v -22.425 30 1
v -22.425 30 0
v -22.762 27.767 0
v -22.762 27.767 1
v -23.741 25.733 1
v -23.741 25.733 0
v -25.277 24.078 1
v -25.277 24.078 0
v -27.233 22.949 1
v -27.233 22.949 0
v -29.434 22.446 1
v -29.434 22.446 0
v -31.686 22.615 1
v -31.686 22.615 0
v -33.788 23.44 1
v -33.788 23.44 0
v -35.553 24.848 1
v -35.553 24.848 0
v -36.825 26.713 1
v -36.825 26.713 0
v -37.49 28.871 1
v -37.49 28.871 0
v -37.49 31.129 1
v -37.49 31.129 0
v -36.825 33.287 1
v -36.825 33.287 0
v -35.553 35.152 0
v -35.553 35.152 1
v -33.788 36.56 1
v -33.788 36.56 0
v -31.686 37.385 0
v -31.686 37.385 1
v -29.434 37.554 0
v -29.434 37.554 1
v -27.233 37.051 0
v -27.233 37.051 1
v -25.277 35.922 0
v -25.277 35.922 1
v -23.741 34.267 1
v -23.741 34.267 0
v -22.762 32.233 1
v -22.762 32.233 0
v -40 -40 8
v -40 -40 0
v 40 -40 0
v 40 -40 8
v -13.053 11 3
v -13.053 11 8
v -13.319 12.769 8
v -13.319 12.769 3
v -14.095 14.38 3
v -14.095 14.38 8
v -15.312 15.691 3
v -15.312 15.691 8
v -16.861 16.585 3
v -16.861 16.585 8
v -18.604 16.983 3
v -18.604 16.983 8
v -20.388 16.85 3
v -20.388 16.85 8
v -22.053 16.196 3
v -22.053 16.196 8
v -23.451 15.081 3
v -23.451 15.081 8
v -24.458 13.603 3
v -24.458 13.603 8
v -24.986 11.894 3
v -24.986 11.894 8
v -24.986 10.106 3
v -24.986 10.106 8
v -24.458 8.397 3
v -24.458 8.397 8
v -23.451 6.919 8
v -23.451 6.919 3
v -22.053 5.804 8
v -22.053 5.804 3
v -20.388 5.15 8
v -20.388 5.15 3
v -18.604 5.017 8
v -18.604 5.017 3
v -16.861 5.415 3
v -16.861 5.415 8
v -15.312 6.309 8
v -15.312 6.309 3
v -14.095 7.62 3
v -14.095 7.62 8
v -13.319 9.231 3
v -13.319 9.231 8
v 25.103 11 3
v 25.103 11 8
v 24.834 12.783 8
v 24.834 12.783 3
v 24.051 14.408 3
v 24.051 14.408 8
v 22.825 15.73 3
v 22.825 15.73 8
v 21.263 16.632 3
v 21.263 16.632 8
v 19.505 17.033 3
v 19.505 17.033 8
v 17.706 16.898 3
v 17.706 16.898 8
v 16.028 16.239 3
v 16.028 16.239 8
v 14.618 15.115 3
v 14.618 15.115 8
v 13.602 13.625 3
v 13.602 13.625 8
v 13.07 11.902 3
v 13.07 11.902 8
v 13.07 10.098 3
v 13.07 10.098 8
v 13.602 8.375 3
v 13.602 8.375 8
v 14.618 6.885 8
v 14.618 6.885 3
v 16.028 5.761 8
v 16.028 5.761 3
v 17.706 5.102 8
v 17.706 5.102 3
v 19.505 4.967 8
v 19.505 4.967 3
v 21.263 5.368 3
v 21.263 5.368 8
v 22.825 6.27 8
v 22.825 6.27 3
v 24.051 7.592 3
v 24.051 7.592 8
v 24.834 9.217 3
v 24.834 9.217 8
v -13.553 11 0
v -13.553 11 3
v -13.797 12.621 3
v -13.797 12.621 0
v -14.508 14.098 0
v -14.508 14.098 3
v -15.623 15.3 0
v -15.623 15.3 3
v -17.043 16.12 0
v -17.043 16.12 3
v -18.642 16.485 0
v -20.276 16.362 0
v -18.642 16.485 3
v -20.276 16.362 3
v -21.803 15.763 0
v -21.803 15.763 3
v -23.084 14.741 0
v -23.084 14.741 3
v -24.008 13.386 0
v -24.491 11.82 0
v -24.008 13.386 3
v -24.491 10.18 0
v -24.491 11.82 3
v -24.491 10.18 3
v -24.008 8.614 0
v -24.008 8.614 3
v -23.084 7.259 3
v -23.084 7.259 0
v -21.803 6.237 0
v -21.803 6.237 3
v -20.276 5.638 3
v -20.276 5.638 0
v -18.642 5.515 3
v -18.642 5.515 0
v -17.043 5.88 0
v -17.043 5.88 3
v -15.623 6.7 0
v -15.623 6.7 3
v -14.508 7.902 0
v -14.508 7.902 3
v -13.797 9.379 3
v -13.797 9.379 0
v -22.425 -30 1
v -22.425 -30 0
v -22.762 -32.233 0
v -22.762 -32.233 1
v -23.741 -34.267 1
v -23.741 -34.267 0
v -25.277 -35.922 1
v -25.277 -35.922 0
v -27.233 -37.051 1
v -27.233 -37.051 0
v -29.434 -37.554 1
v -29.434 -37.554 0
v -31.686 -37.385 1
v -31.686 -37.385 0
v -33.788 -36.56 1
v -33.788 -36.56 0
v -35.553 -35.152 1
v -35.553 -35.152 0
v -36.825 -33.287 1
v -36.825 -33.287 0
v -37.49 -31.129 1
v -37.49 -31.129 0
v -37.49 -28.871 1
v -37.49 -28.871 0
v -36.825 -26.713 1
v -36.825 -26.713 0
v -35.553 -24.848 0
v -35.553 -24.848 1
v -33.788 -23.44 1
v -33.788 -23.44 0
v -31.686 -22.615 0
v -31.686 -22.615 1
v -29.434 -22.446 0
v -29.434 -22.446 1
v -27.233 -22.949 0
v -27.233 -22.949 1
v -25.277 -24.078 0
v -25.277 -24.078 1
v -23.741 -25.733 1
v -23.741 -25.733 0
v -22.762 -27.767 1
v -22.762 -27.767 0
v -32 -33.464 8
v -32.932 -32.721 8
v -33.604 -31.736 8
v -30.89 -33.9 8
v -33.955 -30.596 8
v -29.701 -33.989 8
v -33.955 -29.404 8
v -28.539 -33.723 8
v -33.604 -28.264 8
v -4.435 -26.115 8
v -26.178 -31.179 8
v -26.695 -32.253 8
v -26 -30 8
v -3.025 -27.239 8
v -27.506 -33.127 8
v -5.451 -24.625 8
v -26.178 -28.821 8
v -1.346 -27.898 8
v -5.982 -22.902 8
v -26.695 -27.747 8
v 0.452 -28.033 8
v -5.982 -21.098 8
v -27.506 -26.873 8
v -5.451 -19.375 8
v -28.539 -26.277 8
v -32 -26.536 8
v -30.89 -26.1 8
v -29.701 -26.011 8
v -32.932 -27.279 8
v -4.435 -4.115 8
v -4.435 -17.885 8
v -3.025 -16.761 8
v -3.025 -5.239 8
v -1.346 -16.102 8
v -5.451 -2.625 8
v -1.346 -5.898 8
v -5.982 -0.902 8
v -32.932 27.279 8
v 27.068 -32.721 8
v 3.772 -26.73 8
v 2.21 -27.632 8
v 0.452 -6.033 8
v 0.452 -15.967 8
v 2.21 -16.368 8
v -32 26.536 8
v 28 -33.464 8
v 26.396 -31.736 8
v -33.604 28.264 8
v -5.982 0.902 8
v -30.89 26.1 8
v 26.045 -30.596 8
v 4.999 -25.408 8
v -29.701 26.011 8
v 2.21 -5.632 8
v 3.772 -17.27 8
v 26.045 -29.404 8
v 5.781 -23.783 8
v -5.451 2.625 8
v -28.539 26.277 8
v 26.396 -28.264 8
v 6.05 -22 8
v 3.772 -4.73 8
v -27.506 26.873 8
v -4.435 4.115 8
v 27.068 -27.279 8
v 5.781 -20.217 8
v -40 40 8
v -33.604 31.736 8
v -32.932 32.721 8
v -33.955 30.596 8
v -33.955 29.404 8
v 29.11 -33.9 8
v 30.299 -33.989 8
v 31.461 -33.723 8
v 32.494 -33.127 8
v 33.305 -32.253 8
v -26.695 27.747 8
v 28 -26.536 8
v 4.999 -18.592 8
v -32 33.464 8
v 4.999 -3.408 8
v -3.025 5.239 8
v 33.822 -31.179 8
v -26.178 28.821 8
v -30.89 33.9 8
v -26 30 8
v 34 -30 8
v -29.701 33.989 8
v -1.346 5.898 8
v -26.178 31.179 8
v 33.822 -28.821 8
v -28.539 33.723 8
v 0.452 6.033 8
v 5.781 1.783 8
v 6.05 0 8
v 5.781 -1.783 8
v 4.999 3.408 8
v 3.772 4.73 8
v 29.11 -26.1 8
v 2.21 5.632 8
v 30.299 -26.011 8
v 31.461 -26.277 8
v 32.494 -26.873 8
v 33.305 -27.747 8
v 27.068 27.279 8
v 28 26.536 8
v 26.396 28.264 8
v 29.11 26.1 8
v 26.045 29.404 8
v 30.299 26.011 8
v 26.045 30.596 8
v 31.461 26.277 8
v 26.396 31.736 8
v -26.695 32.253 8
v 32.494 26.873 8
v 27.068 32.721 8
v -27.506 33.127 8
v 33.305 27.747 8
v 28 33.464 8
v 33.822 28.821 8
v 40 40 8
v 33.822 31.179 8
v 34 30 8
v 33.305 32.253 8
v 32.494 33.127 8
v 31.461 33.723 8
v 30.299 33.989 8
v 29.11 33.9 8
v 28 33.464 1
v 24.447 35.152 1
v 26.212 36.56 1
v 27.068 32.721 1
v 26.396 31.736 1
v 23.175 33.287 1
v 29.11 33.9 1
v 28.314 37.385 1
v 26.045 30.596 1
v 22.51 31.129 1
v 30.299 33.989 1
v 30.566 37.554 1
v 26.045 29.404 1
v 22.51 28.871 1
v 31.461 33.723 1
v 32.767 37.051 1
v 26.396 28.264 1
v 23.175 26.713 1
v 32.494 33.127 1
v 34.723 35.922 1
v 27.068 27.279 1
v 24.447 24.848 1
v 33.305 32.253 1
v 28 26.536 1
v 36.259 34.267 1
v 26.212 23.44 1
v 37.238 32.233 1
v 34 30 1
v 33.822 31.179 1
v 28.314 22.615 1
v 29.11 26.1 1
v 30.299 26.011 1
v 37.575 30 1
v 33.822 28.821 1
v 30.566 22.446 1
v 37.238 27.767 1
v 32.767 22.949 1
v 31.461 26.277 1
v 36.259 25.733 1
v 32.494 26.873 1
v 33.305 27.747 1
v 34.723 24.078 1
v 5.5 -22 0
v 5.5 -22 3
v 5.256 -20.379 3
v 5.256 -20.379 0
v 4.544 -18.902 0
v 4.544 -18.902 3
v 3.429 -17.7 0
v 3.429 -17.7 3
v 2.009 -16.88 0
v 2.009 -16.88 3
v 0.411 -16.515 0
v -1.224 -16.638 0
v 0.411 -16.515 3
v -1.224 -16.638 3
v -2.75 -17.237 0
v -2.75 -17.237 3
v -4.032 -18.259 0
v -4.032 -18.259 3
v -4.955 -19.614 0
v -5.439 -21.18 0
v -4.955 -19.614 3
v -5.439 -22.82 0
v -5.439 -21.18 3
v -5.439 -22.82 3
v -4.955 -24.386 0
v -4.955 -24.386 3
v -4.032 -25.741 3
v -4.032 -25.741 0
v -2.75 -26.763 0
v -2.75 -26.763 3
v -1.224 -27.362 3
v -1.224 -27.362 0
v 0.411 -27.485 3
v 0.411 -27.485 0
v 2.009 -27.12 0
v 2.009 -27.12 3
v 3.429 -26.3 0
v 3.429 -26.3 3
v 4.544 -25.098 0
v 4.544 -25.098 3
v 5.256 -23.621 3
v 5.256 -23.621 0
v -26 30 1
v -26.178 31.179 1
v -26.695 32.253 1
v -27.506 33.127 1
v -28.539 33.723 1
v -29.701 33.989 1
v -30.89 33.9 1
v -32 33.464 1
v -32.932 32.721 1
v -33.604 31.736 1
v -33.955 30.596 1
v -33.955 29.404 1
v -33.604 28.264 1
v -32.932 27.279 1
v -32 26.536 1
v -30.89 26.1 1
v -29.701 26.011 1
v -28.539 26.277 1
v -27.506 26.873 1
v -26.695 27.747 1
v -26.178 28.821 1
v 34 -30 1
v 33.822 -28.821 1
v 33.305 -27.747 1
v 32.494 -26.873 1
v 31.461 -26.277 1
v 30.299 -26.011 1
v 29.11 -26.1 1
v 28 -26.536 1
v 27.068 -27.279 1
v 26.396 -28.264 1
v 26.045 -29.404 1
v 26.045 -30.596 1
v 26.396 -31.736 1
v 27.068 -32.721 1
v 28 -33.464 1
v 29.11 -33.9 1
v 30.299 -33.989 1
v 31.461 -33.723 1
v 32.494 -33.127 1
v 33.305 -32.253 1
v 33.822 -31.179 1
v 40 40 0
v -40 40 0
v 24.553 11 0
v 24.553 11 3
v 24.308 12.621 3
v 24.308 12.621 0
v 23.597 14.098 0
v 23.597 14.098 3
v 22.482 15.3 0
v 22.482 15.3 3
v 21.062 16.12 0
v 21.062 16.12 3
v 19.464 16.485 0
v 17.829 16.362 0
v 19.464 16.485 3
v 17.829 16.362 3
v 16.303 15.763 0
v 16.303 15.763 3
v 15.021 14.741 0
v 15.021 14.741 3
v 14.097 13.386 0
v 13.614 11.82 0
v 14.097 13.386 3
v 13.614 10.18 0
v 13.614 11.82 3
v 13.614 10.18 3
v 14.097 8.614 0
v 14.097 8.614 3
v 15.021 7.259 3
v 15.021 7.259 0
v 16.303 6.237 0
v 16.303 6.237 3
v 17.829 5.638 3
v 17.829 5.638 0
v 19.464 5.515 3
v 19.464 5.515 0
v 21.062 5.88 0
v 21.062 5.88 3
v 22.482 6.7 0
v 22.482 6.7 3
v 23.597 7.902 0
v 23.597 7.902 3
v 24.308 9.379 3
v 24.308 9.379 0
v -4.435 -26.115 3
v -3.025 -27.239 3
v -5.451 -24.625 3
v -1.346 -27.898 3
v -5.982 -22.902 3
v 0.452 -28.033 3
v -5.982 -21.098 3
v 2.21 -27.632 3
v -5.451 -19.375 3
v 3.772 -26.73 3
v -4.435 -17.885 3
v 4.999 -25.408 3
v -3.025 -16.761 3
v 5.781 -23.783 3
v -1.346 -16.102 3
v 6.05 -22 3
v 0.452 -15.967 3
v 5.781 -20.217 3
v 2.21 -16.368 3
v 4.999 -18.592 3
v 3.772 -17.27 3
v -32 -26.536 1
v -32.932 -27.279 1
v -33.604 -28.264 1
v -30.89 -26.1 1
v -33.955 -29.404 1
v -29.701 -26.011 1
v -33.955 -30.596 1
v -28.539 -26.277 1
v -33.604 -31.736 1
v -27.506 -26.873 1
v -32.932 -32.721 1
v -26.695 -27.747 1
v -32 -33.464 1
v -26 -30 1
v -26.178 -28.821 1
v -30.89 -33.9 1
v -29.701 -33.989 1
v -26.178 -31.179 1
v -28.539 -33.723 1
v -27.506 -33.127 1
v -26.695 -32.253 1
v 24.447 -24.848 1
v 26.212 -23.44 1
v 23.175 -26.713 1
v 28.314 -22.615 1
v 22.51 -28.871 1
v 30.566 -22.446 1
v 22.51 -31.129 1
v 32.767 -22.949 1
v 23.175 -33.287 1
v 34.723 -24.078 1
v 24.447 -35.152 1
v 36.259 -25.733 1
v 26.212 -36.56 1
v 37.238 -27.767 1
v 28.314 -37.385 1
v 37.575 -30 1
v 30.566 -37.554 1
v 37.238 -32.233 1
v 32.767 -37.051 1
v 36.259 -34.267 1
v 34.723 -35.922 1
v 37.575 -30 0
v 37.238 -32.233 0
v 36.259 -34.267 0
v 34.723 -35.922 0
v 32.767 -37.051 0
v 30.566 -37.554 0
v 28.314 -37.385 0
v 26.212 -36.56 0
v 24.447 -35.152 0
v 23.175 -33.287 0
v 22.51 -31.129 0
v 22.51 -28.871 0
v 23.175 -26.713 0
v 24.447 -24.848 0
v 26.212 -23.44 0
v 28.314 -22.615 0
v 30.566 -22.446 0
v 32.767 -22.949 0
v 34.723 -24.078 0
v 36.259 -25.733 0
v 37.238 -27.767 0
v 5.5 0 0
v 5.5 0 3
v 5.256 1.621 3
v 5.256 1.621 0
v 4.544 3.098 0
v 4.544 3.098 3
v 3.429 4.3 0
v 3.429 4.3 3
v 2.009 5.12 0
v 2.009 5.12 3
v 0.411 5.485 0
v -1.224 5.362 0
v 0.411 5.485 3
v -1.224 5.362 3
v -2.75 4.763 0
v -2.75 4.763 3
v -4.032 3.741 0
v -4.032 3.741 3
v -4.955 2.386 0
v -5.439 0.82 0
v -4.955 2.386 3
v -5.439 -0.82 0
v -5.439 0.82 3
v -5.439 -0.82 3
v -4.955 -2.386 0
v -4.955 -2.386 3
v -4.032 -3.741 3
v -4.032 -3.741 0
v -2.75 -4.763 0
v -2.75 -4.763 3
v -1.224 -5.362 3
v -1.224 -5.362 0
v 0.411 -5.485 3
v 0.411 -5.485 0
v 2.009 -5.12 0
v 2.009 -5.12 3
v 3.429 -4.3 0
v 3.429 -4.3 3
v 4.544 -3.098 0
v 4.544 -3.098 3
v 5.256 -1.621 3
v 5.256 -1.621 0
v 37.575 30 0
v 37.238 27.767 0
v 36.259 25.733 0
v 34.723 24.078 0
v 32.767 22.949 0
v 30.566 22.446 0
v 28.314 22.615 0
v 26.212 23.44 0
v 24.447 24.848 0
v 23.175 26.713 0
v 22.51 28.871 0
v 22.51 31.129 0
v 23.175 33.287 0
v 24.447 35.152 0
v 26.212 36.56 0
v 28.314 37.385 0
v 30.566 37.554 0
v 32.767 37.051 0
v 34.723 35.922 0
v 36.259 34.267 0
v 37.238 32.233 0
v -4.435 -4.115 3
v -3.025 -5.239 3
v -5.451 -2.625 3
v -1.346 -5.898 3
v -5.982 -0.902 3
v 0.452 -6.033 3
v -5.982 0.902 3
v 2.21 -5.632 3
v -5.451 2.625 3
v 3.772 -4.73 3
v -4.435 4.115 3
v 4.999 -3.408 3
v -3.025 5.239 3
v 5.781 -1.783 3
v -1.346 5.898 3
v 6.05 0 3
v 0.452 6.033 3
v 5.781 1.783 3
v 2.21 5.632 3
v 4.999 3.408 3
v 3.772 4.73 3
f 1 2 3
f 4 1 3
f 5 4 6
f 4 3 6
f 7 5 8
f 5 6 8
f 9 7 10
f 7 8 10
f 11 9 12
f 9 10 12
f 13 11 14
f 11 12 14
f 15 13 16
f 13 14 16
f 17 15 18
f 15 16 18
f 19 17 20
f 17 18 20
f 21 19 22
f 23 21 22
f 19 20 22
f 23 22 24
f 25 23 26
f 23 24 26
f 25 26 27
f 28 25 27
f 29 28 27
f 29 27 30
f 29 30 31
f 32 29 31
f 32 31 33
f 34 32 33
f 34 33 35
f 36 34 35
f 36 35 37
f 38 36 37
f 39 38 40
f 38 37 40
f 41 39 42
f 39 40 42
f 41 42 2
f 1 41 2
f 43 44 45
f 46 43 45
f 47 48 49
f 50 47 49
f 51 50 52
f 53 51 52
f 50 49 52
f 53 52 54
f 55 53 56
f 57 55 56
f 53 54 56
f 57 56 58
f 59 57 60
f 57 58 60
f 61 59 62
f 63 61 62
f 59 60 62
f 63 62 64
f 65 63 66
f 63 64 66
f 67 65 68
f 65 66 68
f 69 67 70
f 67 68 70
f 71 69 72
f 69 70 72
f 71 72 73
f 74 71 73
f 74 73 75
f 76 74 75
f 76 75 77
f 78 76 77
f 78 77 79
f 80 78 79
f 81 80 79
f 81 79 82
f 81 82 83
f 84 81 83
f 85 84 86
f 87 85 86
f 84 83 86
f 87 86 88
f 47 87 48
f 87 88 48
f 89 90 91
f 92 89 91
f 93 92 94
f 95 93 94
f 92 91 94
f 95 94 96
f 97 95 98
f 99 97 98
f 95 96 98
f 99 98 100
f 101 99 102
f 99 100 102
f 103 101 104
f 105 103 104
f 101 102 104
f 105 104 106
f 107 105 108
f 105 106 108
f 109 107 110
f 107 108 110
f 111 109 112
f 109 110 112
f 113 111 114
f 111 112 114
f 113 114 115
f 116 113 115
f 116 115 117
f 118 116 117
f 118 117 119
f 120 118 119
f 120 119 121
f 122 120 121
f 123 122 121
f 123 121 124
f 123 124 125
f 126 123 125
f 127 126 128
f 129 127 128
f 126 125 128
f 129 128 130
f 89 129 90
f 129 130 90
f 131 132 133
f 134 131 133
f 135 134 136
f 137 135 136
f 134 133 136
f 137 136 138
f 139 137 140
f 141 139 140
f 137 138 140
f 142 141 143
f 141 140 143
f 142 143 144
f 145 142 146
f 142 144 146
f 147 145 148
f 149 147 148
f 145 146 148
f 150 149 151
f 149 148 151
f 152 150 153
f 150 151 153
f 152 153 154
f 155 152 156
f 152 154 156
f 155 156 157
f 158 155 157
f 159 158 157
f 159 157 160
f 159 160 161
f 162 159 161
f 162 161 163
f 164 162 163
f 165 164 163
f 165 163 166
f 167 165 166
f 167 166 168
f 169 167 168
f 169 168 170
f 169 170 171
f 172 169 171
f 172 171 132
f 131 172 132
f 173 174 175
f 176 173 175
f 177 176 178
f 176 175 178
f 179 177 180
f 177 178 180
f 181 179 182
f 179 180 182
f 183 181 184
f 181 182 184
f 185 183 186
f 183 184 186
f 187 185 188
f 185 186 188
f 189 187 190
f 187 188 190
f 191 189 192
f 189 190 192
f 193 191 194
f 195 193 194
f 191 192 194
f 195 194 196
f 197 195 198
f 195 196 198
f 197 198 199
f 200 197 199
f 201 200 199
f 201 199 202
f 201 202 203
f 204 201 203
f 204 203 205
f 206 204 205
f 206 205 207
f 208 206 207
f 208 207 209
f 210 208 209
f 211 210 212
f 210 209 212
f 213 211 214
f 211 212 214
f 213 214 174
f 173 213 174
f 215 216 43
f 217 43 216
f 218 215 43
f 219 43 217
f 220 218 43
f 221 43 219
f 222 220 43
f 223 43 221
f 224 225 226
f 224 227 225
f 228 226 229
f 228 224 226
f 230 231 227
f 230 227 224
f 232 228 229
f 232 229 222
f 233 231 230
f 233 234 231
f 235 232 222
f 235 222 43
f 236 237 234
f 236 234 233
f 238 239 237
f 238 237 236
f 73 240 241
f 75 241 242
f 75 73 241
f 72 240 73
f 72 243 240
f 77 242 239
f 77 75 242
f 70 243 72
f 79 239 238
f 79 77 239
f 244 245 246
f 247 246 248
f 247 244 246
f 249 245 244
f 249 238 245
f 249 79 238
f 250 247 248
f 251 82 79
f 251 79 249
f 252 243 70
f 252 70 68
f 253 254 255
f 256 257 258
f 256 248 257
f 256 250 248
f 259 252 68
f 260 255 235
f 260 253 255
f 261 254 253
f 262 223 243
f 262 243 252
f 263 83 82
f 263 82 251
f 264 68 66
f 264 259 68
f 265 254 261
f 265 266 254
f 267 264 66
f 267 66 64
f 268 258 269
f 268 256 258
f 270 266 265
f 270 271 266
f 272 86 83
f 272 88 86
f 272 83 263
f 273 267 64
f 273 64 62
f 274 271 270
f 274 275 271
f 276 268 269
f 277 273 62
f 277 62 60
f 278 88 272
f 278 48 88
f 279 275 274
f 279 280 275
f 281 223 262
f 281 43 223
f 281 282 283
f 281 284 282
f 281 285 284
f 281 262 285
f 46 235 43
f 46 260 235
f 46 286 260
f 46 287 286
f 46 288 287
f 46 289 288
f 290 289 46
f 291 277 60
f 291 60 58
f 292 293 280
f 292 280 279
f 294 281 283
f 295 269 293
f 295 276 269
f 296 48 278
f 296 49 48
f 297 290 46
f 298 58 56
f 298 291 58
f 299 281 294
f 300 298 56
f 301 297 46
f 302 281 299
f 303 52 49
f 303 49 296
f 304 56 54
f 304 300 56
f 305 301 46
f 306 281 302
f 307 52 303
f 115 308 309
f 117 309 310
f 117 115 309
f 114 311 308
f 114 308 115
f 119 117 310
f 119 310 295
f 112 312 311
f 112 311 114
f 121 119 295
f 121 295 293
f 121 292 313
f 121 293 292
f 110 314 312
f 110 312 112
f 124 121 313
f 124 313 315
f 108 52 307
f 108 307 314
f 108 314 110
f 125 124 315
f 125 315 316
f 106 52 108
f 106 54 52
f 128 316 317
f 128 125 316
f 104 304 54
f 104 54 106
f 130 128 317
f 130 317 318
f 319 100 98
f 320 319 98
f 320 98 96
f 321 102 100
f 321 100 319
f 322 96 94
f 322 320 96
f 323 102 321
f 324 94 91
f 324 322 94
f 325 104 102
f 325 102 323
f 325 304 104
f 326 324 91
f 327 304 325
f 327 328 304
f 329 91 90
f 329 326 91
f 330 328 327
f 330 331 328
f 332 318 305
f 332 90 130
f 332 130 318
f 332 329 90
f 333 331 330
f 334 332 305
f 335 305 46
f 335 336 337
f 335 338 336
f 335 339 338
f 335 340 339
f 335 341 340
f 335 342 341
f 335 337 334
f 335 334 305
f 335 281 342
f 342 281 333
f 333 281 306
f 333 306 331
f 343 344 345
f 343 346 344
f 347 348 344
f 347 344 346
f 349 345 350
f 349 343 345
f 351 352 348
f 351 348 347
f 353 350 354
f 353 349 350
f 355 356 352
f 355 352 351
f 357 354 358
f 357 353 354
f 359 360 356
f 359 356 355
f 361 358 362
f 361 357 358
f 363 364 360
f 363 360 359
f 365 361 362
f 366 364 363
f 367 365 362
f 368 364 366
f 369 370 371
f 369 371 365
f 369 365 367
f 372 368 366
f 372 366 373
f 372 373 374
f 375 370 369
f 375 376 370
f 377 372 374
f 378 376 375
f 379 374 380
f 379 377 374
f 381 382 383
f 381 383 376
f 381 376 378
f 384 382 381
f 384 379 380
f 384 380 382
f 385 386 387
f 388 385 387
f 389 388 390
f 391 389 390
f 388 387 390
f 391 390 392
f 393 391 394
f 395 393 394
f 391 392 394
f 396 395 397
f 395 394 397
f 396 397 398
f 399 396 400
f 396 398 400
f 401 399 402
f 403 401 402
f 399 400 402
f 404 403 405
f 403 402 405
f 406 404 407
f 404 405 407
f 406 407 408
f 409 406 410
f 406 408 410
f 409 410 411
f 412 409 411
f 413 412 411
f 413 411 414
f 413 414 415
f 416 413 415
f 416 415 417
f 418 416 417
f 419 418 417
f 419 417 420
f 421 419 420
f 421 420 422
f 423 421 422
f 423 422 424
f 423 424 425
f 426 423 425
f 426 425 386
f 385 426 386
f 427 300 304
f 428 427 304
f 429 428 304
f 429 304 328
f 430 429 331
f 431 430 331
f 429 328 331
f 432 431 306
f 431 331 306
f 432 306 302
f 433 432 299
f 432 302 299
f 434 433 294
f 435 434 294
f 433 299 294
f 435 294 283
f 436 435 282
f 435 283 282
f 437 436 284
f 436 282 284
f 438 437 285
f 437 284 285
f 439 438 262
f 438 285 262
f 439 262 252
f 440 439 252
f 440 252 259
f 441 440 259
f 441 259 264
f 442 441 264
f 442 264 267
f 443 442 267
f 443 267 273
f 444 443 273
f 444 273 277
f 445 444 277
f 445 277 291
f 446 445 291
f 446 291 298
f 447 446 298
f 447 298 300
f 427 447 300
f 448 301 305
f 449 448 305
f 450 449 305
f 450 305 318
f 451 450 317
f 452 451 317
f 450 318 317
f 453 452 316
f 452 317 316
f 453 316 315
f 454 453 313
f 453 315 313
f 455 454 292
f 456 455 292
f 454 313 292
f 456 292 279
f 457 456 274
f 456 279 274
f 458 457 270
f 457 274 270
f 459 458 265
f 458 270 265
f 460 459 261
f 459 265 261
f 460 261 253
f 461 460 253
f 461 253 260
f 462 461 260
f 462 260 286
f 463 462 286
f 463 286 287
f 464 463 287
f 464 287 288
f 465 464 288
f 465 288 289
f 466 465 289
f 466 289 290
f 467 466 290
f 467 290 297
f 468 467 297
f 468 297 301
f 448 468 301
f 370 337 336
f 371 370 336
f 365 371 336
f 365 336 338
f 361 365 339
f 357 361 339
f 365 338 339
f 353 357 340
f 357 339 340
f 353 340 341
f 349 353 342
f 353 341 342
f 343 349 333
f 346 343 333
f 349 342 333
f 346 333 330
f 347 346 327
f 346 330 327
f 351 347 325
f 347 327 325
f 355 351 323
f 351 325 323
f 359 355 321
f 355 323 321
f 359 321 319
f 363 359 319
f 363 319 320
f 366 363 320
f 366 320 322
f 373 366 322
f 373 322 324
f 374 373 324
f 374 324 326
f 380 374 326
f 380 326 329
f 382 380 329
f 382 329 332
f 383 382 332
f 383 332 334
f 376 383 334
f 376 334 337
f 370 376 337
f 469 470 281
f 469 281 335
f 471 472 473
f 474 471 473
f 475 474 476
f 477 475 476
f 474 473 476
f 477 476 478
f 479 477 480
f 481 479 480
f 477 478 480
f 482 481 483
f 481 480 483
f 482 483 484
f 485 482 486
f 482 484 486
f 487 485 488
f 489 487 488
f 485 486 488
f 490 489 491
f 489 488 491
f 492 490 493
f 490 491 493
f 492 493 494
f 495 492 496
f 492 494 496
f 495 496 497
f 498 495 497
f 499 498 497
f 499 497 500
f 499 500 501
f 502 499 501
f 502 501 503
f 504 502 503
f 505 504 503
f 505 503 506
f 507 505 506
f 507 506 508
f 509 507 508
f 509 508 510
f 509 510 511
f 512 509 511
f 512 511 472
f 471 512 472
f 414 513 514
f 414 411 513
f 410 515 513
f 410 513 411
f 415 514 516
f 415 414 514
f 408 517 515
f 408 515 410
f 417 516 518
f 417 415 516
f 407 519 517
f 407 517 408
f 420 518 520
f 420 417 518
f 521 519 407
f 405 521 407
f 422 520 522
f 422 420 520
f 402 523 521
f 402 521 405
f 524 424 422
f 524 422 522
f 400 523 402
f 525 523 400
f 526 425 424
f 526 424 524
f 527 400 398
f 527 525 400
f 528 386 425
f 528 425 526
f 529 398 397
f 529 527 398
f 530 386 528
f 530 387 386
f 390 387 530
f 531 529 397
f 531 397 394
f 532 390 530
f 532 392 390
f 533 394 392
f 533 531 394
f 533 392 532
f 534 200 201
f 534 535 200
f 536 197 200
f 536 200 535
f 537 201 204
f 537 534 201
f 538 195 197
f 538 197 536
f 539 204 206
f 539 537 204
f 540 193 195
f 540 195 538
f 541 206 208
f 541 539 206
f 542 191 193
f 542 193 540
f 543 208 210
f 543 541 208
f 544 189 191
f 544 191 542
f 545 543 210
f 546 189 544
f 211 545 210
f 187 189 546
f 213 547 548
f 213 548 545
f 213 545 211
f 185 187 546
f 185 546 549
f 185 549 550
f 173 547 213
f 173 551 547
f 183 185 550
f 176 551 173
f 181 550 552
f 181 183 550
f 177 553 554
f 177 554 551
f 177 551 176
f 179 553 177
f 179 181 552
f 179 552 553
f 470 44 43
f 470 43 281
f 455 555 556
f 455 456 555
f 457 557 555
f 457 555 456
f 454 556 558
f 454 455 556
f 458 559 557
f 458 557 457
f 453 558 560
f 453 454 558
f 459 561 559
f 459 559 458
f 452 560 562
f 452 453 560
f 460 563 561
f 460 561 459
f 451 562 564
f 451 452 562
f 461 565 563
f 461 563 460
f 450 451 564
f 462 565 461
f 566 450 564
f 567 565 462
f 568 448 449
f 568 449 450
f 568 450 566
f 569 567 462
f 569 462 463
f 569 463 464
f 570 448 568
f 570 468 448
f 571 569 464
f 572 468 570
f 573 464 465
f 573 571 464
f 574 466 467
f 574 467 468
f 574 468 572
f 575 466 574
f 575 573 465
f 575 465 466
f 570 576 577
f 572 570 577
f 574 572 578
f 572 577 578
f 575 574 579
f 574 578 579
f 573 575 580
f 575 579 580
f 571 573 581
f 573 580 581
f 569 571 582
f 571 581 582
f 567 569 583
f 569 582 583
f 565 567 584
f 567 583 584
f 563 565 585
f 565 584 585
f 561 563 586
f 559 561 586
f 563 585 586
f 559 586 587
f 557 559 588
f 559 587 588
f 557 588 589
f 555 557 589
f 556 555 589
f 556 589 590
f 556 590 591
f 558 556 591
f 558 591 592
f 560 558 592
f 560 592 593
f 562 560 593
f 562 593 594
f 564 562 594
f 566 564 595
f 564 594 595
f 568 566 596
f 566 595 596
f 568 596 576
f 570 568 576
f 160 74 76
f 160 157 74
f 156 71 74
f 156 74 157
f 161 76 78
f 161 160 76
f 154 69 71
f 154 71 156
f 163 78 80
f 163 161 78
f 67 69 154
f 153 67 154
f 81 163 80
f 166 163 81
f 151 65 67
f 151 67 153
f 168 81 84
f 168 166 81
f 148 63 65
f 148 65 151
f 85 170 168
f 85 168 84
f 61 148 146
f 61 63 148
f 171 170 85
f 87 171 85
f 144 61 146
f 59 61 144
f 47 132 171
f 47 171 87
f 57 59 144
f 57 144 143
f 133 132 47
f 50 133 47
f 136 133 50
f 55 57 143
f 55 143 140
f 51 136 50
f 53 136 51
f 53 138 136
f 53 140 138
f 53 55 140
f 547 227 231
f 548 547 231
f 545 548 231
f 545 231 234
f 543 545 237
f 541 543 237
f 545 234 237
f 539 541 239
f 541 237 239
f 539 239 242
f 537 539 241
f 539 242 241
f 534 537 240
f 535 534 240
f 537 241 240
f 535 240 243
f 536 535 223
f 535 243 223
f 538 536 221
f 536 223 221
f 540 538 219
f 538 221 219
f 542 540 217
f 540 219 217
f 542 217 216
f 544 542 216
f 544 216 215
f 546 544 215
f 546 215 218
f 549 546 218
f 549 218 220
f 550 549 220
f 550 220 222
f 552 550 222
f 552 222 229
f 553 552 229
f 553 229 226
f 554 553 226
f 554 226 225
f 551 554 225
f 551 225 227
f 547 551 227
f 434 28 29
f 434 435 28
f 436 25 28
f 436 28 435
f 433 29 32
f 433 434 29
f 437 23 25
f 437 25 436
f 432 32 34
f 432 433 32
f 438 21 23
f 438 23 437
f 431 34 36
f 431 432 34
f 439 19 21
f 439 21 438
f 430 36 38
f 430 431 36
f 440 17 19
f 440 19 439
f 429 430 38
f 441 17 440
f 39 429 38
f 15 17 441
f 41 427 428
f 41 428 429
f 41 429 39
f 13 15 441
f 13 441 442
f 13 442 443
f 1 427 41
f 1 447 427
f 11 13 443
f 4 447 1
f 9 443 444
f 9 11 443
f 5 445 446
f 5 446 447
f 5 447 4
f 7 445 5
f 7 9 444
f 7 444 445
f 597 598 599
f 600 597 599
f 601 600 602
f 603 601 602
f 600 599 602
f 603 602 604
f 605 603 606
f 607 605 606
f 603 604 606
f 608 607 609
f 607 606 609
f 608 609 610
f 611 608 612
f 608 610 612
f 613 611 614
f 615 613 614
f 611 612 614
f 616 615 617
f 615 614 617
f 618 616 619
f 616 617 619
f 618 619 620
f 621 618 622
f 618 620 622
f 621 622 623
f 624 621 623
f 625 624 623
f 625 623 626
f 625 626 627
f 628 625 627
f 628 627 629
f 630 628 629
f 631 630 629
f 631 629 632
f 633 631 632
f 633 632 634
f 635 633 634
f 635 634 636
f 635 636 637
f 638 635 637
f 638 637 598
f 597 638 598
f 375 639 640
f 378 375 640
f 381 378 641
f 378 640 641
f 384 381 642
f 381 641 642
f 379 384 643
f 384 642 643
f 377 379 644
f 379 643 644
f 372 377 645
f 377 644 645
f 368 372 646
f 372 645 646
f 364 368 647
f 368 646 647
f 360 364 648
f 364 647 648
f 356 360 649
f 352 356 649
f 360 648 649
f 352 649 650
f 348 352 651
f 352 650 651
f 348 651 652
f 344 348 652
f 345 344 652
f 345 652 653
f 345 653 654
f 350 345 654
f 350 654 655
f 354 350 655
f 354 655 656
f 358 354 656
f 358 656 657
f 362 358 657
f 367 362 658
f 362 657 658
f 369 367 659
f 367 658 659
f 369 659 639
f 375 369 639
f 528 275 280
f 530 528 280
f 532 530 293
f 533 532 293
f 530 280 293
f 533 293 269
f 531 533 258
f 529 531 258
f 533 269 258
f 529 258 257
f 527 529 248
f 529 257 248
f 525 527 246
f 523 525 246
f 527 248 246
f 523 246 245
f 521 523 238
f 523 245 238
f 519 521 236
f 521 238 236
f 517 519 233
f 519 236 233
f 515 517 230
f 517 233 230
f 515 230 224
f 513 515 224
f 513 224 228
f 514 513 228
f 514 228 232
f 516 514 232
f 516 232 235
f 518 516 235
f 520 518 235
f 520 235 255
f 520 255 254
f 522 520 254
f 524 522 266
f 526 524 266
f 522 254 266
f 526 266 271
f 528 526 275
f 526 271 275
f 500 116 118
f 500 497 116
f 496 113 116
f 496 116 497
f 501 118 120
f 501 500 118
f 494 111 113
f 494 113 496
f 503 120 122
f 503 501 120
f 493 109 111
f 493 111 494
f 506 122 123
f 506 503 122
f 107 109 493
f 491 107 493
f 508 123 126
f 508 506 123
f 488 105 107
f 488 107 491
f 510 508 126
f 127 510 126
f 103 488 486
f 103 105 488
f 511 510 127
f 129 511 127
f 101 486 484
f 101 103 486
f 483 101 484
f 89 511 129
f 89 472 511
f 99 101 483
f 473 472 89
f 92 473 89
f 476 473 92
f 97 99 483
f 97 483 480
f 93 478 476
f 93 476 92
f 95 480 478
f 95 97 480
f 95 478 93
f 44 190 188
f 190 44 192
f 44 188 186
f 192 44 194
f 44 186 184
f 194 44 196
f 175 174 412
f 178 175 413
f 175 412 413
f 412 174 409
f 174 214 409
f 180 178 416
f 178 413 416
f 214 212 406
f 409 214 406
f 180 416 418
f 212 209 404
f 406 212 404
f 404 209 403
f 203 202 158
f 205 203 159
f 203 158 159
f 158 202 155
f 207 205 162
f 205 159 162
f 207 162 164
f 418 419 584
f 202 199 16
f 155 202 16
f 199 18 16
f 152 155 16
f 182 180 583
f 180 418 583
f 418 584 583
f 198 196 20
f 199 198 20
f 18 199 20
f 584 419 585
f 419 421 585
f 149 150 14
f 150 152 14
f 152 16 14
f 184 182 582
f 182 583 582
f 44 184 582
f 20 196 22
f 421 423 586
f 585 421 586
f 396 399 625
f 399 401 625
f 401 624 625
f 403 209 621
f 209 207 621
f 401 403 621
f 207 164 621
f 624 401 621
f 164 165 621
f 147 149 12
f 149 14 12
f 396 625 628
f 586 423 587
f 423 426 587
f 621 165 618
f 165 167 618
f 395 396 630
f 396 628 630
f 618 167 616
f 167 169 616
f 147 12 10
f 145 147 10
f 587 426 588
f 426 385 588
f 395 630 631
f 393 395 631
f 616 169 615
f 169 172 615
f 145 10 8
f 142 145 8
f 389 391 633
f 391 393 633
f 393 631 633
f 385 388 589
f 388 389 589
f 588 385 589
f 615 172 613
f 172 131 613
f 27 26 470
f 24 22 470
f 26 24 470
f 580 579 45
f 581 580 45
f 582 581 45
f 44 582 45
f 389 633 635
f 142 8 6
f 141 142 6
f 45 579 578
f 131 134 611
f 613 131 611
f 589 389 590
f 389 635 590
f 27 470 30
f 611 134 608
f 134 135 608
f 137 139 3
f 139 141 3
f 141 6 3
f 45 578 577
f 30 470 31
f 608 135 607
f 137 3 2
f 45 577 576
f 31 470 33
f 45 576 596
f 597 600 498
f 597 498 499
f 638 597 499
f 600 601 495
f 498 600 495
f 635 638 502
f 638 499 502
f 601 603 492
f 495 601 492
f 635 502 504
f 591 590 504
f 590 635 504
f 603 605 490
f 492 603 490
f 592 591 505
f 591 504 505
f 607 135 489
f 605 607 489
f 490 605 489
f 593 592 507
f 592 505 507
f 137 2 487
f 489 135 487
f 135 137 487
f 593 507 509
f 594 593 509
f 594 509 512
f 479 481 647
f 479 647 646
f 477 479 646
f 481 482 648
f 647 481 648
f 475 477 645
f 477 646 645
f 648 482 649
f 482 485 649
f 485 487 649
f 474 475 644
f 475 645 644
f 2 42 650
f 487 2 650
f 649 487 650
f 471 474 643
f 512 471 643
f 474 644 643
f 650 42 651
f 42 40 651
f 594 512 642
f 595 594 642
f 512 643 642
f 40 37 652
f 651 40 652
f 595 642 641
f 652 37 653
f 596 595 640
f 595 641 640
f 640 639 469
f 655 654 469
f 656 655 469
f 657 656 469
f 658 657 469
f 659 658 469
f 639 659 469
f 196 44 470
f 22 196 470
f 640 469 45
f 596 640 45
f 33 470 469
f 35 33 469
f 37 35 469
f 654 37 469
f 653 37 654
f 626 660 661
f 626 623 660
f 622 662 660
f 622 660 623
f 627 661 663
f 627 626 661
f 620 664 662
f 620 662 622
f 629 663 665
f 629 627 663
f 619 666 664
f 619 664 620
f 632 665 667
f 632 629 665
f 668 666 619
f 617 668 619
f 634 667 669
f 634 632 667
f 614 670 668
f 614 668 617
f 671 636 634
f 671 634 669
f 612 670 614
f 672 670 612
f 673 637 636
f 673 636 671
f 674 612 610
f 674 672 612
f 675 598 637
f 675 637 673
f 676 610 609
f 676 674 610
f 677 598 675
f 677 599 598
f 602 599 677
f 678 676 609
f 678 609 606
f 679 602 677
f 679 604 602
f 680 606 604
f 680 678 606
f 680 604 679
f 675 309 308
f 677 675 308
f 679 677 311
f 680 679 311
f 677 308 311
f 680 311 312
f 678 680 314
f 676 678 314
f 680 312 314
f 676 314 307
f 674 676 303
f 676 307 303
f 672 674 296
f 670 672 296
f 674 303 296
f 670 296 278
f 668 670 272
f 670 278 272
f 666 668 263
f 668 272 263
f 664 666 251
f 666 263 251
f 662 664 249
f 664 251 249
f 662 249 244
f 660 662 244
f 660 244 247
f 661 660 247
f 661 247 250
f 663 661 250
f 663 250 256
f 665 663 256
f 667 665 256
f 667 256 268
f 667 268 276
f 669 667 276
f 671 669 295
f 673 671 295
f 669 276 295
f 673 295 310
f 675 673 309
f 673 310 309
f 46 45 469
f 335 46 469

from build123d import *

# Parameters (mm, degrees)
F0_W     = 80
F0_H     = 80
F1_DEPTH = 8
F2_R     = 5.5
F2_R_2   = 4
F3_DEPTH = 25
F4_R     = 6
F4_R_2   = 6.05
F5_DEPTH = 5
F6_R     = 7.575
F7_DEPTH = 1


with BuildPart() as f1:
    # F0 (on Top) → F1 (new body)
    with BuildSketch(Plane.XY):
        Rectangle(F0_W, F0_H)
    extrude(amount=F1_DEPTH)

    # F2 (on face) → F3 (cut)
    with BuildSketch(Plane.XY.offset(8)):
        with Locations((-19.052559, 11)):
            Circle(F2_R)
        with Locations((-30, 30)):
            Circle(F2_R_2)
        with Locations((19.052559, 11)):
            Circle(F2_R)
        with Locations((30, 30)):
            Circle(F2_R_2)
        with Locations((30, -30)):
            Circle(F2_R_2)
        with Locations((0, -22)):
            Circle(F2_R)
        with Locations((-30, -30)):
            Circle(F2_R_2)
        Circle(F2_R)
    extrude(amount=-F3_DEPTH, mode=Mode.SUBTRACT)

    # F4 (on face) → F5 (cut)
    with BuildSketch(Plane.XY.offset(8)):
        with Locations((-19.052559, 11)):
            Circle(F4_R)
        with Locations((19.052559, 11)):
            Circle(F4_R_2)
        Circle(F4_R_2)
        with Locations((0, -22)):
            Circle(F4_R_2)
    extrude(amount=-F5_DEPTH, mode=Mode.SUBTRACT)

    # F6 (on face) → F7 (cut)
    with BuildSketch(Plane(origin=(0, 0, 0), x_dir=(1, 0, 0), z_dir=(0, 0, -1))):
        with Locations((-30, 30)):
            Circle(F6_R)
        with Locations((30, 30)):
            Circle(F6_R)
        with Locations((30, -30)):
            Circle(F6_R)
        with Locations((-30, -30)):
            Circle(F6_R)
    extrude(amount=-F7_DEPTH, mode=Mode.SUBTRACT)


solid = f1.part
